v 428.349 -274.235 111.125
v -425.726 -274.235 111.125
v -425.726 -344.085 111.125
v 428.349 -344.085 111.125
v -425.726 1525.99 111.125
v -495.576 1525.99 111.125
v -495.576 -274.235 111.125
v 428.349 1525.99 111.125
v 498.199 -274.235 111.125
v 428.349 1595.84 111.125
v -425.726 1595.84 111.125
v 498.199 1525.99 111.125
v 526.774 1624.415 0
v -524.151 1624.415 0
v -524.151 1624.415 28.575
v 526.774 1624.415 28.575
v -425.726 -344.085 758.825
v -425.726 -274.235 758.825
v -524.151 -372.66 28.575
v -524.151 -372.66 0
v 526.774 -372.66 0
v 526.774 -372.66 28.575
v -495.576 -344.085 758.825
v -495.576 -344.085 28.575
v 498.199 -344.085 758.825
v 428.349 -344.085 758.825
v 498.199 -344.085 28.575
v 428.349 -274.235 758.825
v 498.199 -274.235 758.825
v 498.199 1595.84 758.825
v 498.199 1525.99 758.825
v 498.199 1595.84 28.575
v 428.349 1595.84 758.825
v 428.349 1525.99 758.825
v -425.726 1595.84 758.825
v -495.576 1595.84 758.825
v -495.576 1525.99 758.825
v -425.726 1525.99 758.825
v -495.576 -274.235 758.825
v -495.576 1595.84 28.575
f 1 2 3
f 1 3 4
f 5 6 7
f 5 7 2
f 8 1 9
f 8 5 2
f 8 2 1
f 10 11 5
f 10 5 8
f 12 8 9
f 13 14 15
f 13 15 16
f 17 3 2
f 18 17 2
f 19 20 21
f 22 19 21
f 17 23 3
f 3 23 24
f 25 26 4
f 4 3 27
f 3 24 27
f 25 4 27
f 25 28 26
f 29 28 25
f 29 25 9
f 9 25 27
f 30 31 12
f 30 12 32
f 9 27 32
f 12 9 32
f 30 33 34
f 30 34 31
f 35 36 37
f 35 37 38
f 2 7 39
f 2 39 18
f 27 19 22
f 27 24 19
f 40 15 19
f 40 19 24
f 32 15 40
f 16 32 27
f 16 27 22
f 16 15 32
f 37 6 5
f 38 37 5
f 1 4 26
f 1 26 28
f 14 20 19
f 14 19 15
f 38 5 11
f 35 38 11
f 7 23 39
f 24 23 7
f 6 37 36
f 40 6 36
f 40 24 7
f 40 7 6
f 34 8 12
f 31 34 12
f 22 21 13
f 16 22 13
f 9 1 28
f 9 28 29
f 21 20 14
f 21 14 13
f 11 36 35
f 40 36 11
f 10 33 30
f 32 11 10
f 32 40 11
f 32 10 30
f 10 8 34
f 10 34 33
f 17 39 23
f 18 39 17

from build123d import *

# Parameters (mm, degrees)
F0_W     = 1050.925
F0_H     = 1997.075
F1_DEPTH = 28.575
F2_W     = 993.775
F2_H     = 1939.925
F3_DEPTH = 82.55
F4_W     = 69.85
F4_H     = 69.85
F5_DEPTH = 647.7


with BuildPart() as f1:
    # F0 (on Top) → F1 (new body)
    with BuildSketch(Plane.XY):
        with Locations((1.311136, 625.877863)):
            Rectangle(F0_W, F0_H)
    extrude(amount=F1_DEPTH)

    # F2 (on face) → F3 (join)
    with BuildSketch(Plane.XY.offset(28.575)):
        with Locations((1.311136, 625.877863)):
            Rectangle(F2_W, F2_H)
    extrude(amount=F3_DEPTH)

    # F4 (on face) → F5 (join)
    with BuildSketch(Plane.XY.offset(111.125)):
        with Locations((-460.651364, 1560.915363)):
            Rectangle(F4_W, F4_H)
        with Locations((463.273636, 1560.915363)):
            Rectangle(F4_W, F4_H)
        with Locations((463.273636, -309.159637)):
            Rectangle(F4_W, F4_H)
        with Locations((-460.651364, -309.159637)):
            Rectangle(F4_W, F4_H)
    extrude(amount=F5_DEPTH)


solid = f1.part
